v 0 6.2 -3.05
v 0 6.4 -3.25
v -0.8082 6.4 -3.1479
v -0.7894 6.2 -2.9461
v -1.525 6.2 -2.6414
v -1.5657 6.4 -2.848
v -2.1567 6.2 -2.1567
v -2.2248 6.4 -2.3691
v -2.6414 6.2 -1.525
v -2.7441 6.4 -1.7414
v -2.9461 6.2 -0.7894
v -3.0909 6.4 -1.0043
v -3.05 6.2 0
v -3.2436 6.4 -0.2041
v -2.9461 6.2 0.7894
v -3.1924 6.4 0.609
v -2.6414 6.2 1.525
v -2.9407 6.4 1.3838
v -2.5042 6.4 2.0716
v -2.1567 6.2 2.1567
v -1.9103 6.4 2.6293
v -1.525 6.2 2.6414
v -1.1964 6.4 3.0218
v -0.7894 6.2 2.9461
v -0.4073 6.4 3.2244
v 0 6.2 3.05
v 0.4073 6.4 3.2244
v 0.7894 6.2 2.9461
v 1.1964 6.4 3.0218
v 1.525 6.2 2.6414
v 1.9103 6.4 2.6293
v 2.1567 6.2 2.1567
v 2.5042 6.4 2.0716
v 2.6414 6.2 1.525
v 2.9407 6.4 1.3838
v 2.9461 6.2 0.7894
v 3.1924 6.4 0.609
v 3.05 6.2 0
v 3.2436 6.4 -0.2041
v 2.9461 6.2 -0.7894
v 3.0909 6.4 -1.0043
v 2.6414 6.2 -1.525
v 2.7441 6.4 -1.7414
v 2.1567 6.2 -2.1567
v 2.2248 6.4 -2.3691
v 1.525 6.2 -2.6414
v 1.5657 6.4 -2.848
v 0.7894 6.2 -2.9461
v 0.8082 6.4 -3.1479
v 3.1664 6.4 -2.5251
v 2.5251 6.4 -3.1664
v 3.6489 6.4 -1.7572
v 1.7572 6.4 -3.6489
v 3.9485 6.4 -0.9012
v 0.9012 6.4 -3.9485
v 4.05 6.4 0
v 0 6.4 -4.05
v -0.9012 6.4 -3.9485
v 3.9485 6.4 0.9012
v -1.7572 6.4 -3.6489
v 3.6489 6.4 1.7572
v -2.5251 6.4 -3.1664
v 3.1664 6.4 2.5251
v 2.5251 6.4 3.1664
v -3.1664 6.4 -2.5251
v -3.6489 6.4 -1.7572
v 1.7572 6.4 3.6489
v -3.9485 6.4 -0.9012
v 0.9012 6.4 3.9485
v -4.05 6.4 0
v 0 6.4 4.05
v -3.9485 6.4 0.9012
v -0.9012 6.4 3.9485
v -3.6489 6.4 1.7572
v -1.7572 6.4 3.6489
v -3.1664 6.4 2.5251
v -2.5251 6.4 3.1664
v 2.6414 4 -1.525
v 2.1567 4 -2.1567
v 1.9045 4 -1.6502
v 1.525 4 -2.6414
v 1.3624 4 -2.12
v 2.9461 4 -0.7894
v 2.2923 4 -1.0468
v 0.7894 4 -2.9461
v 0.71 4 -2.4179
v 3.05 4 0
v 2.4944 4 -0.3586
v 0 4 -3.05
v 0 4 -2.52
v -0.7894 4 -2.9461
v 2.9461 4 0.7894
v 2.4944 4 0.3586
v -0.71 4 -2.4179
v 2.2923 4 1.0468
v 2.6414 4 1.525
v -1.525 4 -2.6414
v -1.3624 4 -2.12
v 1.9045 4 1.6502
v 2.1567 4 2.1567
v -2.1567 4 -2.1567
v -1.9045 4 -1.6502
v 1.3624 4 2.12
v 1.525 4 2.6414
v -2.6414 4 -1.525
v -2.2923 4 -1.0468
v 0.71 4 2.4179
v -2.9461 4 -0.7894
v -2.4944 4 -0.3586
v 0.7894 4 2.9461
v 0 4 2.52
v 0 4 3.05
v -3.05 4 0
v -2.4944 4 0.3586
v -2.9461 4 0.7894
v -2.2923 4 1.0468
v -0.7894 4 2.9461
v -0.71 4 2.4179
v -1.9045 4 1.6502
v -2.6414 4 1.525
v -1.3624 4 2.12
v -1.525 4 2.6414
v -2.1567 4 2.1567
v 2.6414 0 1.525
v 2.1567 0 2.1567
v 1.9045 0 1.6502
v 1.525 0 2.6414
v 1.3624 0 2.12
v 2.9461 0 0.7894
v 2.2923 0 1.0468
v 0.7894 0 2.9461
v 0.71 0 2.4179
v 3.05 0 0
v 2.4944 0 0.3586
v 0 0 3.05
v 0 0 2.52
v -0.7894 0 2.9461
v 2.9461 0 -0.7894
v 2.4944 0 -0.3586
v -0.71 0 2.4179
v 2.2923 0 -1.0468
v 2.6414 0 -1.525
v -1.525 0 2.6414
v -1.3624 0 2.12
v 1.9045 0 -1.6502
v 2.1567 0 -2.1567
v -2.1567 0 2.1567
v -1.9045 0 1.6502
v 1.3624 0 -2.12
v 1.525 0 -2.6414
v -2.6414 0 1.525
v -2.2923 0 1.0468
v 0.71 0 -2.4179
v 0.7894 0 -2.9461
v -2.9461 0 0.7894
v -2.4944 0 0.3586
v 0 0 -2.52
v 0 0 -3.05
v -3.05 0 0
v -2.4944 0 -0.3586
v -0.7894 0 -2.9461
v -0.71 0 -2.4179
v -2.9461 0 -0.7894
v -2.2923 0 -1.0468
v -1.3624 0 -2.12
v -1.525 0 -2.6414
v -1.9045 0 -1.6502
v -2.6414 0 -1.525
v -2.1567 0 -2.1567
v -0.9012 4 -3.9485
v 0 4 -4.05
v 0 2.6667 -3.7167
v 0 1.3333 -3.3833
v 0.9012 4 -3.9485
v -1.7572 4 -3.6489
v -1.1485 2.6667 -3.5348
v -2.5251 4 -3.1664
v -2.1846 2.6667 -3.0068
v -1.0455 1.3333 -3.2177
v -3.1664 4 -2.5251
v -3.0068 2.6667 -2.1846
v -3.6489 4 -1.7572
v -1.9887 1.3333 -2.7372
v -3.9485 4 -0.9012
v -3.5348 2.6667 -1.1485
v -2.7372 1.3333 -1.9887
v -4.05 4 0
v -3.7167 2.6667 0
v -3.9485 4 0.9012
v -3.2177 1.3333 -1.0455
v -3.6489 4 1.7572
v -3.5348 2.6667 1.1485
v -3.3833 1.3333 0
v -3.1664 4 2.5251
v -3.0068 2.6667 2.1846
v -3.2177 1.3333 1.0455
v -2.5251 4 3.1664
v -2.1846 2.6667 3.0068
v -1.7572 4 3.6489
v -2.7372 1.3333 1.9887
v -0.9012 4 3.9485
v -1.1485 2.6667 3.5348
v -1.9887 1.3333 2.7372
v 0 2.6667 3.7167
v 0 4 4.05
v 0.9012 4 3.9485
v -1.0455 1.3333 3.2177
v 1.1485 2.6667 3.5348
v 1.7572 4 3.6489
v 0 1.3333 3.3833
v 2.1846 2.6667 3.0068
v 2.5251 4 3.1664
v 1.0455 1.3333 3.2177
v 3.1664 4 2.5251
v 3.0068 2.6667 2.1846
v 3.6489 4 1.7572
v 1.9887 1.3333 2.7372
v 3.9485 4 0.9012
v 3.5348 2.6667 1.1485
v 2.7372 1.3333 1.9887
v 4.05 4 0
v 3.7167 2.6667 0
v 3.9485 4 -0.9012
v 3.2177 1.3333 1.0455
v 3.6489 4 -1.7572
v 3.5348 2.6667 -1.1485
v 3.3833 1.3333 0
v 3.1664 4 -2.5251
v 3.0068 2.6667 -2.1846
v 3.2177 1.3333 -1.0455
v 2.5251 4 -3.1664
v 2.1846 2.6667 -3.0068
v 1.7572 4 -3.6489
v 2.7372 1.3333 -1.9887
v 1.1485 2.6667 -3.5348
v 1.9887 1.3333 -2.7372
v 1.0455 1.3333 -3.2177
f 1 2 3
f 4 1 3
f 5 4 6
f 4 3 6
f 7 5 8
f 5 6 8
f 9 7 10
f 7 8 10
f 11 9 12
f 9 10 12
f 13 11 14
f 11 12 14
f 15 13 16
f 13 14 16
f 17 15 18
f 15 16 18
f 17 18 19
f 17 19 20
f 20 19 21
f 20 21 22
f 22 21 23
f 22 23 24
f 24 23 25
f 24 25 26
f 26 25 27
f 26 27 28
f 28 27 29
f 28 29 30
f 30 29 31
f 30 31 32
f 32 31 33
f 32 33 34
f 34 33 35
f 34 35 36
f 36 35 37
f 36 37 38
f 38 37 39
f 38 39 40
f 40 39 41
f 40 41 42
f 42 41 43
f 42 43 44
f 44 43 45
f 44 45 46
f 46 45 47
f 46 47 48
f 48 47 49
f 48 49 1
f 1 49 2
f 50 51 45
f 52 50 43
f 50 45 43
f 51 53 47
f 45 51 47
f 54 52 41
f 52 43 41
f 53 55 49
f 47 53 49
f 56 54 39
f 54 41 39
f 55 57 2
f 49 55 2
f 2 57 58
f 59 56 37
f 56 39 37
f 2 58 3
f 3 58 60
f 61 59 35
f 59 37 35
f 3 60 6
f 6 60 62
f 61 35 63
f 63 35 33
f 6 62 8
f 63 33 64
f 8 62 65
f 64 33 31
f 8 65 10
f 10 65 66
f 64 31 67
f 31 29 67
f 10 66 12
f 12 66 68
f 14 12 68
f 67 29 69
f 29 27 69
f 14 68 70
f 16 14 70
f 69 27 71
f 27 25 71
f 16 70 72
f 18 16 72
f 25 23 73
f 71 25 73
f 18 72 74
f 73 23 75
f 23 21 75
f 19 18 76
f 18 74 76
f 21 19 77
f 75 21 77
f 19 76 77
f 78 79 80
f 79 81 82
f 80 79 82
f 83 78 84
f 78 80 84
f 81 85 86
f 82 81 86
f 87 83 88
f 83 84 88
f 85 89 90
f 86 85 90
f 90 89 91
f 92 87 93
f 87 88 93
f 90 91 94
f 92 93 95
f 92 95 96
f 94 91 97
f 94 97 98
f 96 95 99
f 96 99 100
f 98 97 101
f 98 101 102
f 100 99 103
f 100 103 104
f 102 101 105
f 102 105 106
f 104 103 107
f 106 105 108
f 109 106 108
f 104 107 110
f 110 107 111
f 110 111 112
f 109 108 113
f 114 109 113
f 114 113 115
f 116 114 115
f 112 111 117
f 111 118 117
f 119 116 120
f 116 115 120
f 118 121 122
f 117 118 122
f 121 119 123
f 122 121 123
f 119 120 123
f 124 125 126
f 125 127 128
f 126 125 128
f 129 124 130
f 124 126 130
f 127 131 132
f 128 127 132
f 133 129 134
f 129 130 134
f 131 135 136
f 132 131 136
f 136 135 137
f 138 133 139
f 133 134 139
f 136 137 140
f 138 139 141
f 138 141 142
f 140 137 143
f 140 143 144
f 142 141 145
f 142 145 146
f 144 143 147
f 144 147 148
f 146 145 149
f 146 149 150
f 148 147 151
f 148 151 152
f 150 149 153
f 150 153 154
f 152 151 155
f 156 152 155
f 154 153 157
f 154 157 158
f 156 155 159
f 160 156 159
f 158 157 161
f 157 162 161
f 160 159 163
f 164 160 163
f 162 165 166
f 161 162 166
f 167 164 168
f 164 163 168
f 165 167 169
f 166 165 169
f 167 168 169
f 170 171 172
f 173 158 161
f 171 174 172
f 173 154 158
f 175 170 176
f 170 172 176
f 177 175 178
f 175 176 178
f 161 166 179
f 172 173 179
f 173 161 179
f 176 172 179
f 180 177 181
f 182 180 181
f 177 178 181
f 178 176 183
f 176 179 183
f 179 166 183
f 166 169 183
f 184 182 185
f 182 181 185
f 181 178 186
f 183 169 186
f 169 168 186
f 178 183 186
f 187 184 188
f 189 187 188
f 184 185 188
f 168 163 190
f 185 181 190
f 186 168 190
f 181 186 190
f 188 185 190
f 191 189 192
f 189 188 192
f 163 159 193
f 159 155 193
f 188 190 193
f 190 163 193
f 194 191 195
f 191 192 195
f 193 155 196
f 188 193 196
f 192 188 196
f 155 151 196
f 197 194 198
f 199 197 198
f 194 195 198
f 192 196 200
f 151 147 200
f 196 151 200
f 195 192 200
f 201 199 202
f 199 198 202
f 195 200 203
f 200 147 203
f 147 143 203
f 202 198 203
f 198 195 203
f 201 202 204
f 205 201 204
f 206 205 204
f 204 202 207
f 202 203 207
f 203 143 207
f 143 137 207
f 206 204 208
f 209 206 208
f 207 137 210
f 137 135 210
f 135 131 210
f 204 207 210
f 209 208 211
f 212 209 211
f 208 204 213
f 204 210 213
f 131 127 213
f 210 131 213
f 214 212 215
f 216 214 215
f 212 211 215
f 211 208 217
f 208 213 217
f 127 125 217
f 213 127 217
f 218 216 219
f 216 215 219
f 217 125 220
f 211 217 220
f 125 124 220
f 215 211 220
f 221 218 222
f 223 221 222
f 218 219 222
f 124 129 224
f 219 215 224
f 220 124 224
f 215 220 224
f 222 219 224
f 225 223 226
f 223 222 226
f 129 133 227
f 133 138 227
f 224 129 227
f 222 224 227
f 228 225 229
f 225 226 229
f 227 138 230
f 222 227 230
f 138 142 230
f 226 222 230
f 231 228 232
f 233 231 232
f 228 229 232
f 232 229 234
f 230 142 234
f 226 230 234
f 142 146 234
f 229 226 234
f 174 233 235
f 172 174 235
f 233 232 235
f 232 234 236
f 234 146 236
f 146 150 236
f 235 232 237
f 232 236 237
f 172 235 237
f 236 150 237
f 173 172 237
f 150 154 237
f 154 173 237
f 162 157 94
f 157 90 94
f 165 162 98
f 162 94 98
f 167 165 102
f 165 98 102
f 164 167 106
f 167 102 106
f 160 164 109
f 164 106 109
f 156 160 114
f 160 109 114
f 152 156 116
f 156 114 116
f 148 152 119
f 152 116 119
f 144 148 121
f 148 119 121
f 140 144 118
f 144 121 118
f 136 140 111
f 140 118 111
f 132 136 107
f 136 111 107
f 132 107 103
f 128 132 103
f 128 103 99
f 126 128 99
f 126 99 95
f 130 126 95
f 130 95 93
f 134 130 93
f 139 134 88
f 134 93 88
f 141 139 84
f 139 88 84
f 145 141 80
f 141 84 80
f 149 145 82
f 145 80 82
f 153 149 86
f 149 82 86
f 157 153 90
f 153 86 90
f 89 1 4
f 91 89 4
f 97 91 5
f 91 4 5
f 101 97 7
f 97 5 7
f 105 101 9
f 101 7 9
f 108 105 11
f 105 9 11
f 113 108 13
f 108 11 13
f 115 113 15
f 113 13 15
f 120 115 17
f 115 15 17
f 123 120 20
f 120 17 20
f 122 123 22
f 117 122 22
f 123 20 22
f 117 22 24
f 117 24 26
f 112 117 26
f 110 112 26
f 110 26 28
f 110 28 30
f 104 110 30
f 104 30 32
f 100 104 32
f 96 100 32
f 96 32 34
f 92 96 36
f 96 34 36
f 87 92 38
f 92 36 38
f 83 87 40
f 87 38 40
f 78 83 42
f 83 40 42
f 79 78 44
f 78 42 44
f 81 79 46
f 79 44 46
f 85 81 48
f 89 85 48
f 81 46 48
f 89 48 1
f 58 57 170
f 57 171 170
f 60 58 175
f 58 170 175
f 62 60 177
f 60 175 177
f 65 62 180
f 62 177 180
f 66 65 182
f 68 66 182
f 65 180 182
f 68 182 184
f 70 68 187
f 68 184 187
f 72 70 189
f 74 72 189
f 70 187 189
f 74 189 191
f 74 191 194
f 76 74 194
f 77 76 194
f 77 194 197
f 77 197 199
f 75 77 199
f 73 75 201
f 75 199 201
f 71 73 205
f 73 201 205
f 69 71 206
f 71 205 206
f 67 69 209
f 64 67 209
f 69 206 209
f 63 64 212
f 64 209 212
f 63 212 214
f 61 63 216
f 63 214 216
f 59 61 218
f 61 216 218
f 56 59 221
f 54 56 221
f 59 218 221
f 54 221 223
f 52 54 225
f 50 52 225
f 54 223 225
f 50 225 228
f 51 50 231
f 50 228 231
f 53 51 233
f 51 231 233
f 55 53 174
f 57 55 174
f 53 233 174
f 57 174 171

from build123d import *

# Parameters (mm, degrees)
CHAMFER1_SIZE = 0.2


with BuildPart() as part:
    # Sketch1 → Revolve1 (revolve)
    with BuildSketch(Plane.XY, mode=Mode.PRIVATE) as revolve1_sk:
        Polygon((2.52, 0), (2.52, 4), (3.05, 4), (3.05, 6.4), (4.05, 6.4), (4.05, 4), (3.05, 0), align=None)
    revolve(revolve1_sk.sketch.rotate(Axis((0, 0, 0), (0, 1, 0)), 90), axis=Axis((0, 0, 0), (0, 1, 0)))

    # Chamfer1
    chamfer1_edges = [part.edges().sort_by_distance(p)[0] for p in [
        (0, 6.4, 3.05),
    ]]
    chamfer(chamfer1_edges, length=CHAMFER1_SIZE)


solid = part.part
